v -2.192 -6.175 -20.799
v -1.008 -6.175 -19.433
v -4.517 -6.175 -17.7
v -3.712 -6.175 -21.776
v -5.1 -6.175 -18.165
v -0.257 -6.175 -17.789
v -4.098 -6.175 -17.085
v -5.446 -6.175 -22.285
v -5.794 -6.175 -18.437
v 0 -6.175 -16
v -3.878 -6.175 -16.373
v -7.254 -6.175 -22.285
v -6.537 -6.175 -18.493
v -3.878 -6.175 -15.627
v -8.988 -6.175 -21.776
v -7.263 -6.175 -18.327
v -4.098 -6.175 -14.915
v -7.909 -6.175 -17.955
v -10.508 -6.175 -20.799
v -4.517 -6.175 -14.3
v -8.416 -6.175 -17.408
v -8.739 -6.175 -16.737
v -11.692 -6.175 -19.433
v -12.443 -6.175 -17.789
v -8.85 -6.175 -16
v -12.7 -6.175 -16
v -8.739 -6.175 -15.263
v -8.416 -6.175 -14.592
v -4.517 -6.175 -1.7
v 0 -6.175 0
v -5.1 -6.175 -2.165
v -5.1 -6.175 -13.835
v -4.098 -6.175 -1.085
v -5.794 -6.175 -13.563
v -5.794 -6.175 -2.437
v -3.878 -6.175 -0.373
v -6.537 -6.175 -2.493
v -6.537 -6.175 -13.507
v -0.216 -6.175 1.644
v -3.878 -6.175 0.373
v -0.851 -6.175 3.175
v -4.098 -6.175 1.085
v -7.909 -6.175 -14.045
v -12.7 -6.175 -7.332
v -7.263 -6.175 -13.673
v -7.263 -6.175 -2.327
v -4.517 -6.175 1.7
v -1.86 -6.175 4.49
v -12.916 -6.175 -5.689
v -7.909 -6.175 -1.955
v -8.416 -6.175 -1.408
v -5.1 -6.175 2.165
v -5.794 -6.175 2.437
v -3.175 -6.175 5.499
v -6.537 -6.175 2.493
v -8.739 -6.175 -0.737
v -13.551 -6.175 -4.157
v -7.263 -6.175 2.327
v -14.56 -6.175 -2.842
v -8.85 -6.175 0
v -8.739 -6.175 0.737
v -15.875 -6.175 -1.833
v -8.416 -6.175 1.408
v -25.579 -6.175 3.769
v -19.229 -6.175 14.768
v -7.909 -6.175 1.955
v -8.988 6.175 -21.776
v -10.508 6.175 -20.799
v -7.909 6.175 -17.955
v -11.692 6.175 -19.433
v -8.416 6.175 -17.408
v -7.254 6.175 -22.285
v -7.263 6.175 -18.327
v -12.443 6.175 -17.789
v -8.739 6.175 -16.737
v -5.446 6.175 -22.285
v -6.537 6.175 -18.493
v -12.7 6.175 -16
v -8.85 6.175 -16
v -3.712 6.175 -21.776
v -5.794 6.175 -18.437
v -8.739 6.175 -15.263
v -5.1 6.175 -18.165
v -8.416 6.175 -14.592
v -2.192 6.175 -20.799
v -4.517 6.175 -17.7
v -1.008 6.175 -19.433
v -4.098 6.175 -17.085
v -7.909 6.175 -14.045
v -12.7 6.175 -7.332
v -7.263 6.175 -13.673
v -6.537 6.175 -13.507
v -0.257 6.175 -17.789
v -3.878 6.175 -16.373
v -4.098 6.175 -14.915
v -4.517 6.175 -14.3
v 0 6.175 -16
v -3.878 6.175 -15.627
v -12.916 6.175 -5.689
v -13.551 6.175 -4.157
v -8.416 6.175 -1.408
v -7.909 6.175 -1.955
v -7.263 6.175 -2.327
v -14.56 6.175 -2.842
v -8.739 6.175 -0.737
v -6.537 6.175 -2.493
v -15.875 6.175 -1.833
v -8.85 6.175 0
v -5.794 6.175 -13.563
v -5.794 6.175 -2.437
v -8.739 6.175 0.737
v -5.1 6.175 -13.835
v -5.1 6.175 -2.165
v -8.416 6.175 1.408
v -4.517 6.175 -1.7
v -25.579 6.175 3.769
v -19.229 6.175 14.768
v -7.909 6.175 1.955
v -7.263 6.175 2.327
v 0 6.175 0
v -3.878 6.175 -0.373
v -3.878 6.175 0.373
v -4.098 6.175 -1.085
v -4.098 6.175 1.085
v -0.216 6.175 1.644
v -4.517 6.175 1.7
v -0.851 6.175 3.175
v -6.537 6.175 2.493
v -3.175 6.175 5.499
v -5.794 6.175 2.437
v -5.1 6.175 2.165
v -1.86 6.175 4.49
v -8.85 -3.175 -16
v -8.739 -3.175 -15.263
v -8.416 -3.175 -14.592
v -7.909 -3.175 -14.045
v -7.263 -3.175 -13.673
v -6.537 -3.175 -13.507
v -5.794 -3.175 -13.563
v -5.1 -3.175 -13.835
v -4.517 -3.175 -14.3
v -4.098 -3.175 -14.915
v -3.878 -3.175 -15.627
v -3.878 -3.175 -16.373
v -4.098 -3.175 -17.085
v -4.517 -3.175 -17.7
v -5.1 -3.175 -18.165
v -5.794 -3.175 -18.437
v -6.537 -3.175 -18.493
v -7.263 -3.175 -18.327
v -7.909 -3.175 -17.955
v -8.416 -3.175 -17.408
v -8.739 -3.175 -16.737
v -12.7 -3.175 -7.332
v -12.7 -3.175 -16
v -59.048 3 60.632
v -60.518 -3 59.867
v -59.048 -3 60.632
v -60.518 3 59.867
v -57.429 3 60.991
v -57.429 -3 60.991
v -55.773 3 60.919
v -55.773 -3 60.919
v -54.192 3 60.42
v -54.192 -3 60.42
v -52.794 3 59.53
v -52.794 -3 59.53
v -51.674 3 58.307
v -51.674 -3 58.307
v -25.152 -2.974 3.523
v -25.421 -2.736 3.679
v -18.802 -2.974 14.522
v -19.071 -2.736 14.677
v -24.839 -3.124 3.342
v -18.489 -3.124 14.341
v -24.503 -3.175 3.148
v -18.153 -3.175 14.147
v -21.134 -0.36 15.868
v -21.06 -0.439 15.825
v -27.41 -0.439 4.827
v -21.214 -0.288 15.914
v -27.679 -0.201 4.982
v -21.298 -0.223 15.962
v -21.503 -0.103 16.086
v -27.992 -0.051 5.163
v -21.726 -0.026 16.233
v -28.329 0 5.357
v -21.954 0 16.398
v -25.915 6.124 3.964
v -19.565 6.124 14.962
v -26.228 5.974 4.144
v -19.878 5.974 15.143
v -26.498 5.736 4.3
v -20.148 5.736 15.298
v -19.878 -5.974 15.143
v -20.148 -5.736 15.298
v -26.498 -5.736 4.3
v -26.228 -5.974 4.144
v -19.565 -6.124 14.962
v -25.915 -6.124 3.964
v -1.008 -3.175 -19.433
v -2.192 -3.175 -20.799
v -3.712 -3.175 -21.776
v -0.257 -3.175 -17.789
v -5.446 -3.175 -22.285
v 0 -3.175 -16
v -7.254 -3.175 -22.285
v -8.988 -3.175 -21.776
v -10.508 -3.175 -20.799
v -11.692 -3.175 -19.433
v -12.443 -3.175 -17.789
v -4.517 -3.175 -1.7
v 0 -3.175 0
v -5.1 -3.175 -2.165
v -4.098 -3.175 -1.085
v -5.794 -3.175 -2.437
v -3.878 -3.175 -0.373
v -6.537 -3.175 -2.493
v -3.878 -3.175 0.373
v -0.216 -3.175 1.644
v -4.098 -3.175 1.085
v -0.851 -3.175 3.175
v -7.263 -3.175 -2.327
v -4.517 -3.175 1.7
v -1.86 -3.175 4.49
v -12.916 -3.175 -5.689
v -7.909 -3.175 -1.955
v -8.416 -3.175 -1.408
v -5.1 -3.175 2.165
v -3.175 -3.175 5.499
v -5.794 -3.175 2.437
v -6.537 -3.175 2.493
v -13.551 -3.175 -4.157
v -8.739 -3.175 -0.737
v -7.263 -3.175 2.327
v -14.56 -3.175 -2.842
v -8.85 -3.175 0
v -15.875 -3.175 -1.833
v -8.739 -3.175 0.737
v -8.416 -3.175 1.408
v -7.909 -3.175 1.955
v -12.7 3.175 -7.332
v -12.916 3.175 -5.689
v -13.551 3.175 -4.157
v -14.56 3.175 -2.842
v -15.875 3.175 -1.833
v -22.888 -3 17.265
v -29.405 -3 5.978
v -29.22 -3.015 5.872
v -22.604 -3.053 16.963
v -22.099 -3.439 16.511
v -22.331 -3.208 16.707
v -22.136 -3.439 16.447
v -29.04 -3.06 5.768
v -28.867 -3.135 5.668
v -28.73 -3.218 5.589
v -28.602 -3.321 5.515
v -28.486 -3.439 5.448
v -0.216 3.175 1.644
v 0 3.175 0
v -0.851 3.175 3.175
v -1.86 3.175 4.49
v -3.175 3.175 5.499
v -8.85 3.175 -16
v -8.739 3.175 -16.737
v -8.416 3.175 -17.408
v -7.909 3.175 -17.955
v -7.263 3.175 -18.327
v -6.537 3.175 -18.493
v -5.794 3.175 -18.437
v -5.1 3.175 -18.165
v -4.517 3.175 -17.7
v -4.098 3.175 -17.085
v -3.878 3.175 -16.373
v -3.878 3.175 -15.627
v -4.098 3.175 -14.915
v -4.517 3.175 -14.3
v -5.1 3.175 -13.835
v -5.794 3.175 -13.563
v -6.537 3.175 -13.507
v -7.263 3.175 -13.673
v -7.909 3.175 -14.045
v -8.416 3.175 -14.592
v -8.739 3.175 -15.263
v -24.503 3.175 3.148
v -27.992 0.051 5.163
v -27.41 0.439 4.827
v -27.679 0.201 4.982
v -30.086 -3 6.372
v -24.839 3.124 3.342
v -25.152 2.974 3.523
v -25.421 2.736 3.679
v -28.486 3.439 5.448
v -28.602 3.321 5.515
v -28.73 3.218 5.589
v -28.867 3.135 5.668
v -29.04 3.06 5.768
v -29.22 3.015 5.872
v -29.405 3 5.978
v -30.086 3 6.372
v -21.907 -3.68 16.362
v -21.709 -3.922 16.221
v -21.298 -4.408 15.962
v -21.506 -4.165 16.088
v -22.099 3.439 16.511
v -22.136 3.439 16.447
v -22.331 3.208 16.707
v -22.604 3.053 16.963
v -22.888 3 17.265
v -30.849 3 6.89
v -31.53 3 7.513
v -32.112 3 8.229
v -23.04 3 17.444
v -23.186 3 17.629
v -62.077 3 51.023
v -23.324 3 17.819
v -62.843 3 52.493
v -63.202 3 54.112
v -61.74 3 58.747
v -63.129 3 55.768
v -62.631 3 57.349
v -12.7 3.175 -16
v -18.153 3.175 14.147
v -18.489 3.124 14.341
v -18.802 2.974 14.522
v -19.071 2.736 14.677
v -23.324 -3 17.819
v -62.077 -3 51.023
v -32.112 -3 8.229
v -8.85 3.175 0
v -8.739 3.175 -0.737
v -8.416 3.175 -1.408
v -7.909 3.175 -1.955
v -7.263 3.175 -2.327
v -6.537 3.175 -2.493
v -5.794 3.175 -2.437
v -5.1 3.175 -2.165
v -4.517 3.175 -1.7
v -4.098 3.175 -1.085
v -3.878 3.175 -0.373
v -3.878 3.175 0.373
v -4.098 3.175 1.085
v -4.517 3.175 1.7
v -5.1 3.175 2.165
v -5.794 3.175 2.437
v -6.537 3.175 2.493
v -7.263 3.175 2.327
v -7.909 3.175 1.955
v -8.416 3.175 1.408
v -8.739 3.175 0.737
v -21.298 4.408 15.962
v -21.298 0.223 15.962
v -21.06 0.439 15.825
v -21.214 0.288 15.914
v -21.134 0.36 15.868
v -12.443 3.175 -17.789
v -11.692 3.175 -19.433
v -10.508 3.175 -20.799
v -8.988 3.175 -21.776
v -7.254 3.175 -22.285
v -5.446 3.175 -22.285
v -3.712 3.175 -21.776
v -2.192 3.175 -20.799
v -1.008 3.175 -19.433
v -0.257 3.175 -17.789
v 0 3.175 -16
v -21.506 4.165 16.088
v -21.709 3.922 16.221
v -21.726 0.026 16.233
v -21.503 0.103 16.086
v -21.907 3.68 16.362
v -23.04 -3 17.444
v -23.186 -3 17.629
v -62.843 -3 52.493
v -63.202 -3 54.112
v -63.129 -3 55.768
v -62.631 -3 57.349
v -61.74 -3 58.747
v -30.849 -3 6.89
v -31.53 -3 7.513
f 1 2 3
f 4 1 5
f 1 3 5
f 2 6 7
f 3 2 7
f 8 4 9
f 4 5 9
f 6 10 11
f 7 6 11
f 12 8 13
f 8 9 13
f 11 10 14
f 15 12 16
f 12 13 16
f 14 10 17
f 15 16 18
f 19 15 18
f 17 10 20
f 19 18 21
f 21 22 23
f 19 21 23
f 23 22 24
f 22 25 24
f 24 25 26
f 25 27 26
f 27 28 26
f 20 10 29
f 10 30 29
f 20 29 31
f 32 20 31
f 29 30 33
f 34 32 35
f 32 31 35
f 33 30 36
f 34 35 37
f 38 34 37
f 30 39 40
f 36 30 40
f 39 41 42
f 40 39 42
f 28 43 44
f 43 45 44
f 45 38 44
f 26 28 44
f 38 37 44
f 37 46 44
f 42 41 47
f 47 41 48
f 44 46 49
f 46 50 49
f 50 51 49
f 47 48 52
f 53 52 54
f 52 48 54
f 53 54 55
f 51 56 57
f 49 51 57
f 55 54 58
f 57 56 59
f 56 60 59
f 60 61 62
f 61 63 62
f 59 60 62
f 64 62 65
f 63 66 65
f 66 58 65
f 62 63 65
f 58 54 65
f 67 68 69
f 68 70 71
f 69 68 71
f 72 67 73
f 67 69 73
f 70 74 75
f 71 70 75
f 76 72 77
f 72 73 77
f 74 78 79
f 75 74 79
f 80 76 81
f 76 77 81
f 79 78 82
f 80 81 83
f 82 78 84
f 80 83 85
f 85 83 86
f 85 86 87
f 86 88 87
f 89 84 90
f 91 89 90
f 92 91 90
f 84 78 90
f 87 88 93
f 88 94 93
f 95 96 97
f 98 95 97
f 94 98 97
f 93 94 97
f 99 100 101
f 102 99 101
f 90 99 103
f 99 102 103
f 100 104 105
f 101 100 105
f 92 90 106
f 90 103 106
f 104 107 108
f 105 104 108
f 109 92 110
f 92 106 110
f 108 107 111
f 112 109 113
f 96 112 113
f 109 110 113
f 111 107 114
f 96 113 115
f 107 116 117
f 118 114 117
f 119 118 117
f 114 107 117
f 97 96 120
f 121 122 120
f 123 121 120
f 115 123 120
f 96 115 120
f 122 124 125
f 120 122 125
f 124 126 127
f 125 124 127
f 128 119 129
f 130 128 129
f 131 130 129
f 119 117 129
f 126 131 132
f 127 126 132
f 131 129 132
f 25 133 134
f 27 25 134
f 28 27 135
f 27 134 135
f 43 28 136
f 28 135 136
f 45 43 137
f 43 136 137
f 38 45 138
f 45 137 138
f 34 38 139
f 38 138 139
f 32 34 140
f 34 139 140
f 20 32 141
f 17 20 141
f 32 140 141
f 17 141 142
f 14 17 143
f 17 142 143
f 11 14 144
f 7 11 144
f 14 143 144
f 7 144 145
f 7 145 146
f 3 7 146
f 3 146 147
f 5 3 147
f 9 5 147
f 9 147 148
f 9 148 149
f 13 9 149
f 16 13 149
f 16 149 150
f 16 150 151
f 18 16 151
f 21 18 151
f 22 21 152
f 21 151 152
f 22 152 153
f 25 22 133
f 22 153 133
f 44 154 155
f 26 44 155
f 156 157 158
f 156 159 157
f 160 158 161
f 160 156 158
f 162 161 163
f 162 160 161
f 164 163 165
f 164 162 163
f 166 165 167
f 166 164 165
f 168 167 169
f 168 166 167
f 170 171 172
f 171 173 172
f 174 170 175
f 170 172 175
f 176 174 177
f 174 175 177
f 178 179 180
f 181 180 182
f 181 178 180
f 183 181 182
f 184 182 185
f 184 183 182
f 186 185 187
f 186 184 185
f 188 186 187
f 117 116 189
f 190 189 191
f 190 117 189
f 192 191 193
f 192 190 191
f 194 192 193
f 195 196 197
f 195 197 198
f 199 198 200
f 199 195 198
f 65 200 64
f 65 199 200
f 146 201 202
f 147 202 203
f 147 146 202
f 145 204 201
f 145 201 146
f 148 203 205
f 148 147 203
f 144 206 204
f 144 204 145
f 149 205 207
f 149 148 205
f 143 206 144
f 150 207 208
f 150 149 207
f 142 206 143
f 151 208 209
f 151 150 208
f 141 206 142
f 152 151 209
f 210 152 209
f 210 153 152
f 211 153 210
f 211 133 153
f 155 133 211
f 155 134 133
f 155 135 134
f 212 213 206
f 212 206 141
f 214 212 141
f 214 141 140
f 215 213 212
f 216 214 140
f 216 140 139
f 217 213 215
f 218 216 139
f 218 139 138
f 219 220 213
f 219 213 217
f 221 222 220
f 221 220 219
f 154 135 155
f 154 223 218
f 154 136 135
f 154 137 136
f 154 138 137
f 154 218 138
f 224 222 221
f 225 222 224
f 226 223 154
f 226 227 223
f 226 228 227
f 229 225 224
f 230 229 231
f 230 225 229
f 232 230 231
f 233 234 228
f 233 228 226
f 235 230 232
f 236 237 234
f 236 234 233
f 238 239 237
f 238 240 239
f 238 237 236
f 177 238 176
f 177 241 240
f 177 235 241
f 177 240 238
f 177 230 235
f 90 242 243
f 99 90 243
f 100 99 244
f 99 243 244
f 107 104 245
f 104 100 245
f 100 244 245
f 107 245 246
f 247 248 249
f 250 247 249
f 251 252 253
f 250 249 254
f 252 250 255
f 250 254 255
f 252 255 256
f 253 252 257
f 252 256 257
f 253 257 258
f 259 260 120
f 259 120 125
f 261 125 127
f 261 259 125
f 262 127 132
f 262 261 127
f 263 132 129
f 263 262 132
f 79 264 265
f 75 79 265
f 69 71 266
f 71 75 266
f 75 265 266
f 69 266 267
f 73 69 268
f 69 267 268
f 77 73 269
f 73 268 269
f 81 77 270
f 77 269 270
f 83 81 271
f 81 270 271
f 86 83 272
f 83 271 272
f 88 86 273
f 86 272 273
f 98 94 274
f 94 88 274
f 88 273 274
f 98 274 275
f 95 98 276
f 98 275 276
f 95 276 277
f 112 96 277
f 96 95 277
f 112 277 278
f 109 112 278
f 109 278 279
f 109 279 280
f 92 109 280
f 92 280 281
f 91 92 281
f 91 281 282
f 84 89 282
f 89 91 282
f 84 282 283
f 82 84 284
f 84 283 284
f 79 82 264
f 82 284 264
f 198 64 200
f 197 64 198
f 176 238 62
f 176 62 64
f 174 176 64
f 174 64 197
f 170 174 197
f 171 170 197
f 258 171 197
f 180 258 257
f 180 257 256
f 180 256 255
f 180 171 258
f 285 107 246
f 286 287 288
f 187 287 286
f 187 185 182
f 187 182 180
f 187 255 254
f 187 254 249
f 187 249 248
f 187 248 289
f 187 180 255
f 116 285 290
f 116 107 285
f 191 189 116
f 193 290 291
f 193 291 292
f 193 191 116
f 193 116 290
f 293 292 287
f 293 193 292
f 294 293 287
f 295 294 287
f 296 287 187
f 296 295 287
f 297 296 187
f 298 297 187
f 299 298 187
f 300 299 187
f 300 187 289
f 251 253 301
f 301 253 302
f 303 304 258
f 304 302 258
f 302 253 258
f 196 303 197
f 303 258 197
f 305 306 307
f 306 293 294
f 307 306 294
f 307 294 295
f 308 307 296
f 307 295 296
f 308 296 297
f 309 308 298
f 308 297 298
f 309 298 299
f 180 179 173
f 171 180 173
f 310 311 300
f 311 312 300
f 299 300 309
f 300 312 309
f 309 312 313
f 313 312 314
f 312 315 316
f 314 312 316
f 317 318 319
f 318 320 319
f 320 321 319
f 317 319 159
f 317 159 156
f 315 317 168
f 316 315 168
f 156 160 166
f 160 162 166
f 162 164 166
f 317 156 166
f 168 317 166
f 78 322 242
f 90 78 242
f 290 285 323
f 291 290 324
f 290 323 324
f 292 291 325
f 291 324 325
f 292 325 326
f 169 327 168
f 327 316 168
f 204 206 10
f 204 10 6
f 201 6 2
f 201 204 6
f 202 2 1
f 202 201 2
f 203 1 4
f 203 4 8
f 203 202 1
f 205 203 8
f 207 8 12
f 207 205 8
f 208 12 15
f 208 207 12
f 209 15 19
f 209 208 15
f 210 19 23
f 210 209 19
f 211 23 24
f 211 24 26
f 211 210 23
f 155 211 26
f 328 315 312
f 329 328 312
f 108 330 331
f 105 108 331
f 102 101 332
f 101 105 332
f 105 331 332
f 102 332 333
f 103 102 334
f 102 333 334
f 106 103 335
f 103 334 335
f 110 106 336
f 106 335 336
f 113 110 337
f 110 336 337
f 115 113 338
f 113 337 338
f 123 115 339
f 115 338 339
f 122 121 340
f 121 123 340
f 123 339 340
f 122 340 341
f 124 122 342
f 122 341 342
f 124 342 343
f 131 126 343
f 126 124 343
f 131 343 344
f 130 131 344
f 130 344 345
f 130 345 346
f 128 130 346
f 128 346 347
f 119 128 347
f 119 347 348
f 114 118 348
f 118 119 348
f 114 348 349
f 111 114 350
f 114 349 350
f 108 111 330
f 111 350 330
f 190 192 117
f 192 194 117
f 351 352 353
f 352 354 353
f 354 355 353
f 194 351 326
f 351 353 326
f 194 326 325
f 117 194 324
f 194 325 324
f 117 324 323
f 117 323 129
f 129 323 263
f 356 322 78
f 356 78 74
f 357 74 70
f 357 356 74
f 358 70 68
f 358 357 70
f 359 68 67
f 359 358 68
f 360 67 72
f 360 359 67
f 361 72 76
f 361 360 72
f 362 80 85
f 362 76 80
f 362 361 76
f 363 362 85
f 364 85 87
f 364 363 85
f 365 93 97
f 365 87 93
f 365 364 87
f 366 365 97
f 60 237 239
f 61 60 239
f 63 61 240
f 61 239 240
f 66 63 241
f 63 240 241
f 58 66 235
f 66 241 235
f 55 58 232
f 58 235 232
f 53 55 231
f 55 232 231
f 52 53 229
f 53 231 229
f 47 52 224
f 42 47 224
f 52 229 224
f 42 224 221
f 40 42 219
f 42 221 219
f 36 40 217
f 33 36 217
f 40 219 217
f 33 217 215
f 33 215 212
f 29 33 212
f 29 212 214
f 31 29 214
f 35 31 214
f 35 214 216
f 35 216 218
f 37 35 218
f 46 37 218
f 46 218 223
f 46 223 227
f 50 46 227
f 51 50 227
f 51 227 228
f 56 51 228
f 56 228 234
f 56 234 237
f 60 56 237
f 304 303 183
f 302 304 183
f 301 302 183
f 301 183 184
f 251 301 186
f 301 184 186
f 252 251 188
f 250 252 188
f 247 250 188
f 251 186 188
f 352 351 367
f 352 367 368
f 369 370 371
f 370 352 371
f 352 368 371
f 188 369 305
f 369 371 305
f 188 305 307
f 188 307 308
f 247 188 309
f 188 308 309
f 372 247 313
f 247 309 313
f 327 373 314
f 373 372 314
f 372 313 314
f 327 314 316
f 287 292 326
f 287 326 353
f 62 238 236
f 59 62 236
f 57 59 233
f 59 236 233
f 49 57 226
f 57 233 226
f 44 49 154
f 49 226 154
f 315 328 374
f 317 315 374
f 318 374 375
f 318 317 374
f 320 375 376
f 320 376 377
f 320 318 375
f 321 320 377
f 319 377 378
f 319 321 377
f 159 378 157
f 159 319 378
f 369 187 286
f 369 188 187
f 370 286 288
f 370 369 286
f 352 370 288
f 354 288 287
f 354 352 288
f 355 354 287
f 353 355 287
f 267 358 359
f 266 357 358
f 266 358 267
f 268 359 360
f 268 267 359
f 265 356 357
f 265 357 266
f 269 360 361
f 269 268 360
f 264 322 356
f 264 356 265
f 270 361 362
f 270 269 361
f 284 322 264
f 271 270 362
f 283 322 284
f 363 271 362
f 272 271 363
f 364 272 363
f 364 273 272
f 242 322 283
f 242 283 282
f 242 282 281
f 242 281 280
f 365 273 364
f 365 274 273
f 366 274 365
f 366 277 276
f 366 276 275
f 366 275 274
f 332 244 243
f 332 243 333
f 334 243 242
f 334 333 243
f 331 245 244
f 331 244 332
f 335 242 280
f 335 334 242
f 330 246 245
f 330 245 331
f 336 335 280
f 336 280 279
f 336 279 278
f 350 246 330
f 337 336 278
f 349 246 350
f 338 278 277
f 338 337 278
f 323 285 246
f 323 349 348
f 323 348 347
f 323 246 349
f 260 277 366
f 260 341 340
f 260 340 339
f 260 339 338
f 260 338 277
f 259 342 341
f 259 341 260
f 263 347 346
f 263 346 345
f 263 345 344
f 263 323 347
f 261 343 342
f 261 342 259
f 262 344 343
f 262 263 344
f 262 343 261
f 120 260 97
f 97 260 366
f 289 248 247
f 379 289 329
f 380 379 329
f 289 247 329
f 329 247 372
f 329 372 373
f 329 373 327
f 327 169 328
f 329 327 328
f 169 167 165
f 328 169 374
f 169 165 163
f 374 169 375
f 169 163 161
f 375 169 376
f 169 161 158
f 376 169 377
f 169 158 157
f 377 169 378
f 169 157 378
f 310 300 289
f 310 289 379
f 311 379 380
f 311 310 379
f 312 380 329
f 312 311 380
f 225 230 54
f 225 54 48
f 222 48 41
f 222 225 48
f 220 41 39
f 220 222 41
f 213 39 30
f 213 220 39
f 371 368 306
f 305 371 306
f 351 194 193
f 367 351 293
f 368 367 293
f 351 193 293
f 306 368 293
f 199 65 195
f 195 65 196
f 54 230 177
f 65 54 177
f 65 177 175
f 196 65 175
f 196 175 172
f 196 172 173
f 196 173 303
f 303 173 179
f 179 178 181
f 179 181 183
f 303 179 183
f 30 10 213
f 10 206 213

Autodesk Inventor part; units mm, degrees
ref_plane "YZ Plane" through (0, 0, 0) normal (1, 0, 0) x (0, 1, 0)
ref_plane "XZ Plane" through (0, 0, 0) normal (0, 1, 0) x (-1, 0, 0)
ref_plane "XY Plane" through (0, 0, 0) normal (0, 0, 1) x (1, 0, 0)
sketch "Szkic1" plane through (0, 0, 0) normal (0, 1, 0) x (-1, 0, 0)
  line L0 (12.7, -3.666174) -> (12.7, -16)
  line L1 (0, -16) -> (0, 0)
  arc A0 (0, -16) -> (12.7, -16) centre (6.35, -16) ccw
  line L2 (0, 3.666174) -> (22.51666, 16.666174)
  line L3 (0, 0) -> (0, 3.666174)
  line L4 (22.51666, 16.666174) -> (55.316329, 63.508956)
  line L5 (65.71956, 56.224535) -> (31.304974, 7.075413)
  circle A1 centre (6.35, -16) radius 2.5
  circle A2 centre (6.35, 0) radius 2.5
  line L6 (65.71956, 56.224535) -> (55.316329, 63.508956)
  line L7 (22.51666, 16.666174) -> (28.86666, 5.667652)
  line L8 (31.304974, 7.075413) -> (12.7, -3.666174)
  line L9 (19.05, 0) -> (12.7, 10.998523)
  dimension "d5" = 155
  dimension "d7" = 5
  dimension "d9" = 26
  dimension "d11" = 12.7
  dimension "d13" = 60
extrude "Wyciągnięcie proste1" add sketch "Szkic1" against normal blind 3 contours L7 L4 L6 L5 L8
ref_plane "Płaszczyzna konstrukcyjna1" through (-15.875, -6.175, -1.833087) normal (-0.5, 0, -0.8660254) x (-0.8660254, 0, 0.5)
sketch "Szkic2" plane through (-15.875, -6.175, -1.833087) normal (-0.5, 0, -0.8660254) x (-0.8660254, 0, 0.5)
  line L0 (15.001477, 3.175) -> (11.826477, 0)
  line L1 (11.799797, -0.02668) -> (15.001477, 3.175)
  line L2 (12.880157, 5.29632) -> (10.583837, 3)
  line L3 (15.001477, 3.175) -> (15.001477, 6.175)
  line L4 (0, 6.175) -> (16.409238, 6.175)
  line L5 (12.880157, 5.29632) -> (13.758837, 6.175)
  line L6 (15.001477, 3.175) -> (11.826477, 0)
  line L7 (13.758837, 6.175) -> (15.001477, 6.175)
  line L8 (15.001477, 6.175) -> (15.001477, 3.175)
  line L9 (10.583837, 3) -> (0, 3)
  line L10 (10.583837, 3) -> (10.583837, 3)
  line L11 (0, 3) -> (0, 0)
  line L12 (0, 0) -> (11.826477, 0)
  line L13 (11.826477, 0) -> (11.826477, 0)
  point P0 (-12.83161, 6.175)
  dimension "d27" = 3
  dimension "d34" = 3.175
extrude "Wyciągnięcie proste3" add sketch "Szkic2" against normal blind 12.7
extrude "Wyciągnięcie proste4" add sketch "Szkic1" against normal blind 6.175 contours L0 A0 L1 L3 L2 L9 L8
extrude "Wyciągnięcie proste5" cut sketch "Szkic1" against normal blind 3.175 contours L0 A0 L1 L3 L2 L9 L8
fillet "Zaokrąglenie2" radius 1.5 4 edges at (-24.6155, 0, 10.5456) (-21.8659, -3.175, 8.9581) (-22.942, -6.175, 9.5794) (-25.6917, -3, 11.1669)
fillet "Zaokrąglenie3" radius 6.35 6 edges at (-12.7, -4.675, -3.6662) (-31.305, -1.5, 7.0754) (-65.7196, -1.5, 56.2245) (-22.5167, -1.5674, 16.6662) (0, -4.675, 3.6662) (-55.3163, -1.5, 63.509)
mirror "Odbij1" about plane through (-44.11811, 0, 34.588304) normal (0, 1, 0)
properties material "Stal nierdzewna"
